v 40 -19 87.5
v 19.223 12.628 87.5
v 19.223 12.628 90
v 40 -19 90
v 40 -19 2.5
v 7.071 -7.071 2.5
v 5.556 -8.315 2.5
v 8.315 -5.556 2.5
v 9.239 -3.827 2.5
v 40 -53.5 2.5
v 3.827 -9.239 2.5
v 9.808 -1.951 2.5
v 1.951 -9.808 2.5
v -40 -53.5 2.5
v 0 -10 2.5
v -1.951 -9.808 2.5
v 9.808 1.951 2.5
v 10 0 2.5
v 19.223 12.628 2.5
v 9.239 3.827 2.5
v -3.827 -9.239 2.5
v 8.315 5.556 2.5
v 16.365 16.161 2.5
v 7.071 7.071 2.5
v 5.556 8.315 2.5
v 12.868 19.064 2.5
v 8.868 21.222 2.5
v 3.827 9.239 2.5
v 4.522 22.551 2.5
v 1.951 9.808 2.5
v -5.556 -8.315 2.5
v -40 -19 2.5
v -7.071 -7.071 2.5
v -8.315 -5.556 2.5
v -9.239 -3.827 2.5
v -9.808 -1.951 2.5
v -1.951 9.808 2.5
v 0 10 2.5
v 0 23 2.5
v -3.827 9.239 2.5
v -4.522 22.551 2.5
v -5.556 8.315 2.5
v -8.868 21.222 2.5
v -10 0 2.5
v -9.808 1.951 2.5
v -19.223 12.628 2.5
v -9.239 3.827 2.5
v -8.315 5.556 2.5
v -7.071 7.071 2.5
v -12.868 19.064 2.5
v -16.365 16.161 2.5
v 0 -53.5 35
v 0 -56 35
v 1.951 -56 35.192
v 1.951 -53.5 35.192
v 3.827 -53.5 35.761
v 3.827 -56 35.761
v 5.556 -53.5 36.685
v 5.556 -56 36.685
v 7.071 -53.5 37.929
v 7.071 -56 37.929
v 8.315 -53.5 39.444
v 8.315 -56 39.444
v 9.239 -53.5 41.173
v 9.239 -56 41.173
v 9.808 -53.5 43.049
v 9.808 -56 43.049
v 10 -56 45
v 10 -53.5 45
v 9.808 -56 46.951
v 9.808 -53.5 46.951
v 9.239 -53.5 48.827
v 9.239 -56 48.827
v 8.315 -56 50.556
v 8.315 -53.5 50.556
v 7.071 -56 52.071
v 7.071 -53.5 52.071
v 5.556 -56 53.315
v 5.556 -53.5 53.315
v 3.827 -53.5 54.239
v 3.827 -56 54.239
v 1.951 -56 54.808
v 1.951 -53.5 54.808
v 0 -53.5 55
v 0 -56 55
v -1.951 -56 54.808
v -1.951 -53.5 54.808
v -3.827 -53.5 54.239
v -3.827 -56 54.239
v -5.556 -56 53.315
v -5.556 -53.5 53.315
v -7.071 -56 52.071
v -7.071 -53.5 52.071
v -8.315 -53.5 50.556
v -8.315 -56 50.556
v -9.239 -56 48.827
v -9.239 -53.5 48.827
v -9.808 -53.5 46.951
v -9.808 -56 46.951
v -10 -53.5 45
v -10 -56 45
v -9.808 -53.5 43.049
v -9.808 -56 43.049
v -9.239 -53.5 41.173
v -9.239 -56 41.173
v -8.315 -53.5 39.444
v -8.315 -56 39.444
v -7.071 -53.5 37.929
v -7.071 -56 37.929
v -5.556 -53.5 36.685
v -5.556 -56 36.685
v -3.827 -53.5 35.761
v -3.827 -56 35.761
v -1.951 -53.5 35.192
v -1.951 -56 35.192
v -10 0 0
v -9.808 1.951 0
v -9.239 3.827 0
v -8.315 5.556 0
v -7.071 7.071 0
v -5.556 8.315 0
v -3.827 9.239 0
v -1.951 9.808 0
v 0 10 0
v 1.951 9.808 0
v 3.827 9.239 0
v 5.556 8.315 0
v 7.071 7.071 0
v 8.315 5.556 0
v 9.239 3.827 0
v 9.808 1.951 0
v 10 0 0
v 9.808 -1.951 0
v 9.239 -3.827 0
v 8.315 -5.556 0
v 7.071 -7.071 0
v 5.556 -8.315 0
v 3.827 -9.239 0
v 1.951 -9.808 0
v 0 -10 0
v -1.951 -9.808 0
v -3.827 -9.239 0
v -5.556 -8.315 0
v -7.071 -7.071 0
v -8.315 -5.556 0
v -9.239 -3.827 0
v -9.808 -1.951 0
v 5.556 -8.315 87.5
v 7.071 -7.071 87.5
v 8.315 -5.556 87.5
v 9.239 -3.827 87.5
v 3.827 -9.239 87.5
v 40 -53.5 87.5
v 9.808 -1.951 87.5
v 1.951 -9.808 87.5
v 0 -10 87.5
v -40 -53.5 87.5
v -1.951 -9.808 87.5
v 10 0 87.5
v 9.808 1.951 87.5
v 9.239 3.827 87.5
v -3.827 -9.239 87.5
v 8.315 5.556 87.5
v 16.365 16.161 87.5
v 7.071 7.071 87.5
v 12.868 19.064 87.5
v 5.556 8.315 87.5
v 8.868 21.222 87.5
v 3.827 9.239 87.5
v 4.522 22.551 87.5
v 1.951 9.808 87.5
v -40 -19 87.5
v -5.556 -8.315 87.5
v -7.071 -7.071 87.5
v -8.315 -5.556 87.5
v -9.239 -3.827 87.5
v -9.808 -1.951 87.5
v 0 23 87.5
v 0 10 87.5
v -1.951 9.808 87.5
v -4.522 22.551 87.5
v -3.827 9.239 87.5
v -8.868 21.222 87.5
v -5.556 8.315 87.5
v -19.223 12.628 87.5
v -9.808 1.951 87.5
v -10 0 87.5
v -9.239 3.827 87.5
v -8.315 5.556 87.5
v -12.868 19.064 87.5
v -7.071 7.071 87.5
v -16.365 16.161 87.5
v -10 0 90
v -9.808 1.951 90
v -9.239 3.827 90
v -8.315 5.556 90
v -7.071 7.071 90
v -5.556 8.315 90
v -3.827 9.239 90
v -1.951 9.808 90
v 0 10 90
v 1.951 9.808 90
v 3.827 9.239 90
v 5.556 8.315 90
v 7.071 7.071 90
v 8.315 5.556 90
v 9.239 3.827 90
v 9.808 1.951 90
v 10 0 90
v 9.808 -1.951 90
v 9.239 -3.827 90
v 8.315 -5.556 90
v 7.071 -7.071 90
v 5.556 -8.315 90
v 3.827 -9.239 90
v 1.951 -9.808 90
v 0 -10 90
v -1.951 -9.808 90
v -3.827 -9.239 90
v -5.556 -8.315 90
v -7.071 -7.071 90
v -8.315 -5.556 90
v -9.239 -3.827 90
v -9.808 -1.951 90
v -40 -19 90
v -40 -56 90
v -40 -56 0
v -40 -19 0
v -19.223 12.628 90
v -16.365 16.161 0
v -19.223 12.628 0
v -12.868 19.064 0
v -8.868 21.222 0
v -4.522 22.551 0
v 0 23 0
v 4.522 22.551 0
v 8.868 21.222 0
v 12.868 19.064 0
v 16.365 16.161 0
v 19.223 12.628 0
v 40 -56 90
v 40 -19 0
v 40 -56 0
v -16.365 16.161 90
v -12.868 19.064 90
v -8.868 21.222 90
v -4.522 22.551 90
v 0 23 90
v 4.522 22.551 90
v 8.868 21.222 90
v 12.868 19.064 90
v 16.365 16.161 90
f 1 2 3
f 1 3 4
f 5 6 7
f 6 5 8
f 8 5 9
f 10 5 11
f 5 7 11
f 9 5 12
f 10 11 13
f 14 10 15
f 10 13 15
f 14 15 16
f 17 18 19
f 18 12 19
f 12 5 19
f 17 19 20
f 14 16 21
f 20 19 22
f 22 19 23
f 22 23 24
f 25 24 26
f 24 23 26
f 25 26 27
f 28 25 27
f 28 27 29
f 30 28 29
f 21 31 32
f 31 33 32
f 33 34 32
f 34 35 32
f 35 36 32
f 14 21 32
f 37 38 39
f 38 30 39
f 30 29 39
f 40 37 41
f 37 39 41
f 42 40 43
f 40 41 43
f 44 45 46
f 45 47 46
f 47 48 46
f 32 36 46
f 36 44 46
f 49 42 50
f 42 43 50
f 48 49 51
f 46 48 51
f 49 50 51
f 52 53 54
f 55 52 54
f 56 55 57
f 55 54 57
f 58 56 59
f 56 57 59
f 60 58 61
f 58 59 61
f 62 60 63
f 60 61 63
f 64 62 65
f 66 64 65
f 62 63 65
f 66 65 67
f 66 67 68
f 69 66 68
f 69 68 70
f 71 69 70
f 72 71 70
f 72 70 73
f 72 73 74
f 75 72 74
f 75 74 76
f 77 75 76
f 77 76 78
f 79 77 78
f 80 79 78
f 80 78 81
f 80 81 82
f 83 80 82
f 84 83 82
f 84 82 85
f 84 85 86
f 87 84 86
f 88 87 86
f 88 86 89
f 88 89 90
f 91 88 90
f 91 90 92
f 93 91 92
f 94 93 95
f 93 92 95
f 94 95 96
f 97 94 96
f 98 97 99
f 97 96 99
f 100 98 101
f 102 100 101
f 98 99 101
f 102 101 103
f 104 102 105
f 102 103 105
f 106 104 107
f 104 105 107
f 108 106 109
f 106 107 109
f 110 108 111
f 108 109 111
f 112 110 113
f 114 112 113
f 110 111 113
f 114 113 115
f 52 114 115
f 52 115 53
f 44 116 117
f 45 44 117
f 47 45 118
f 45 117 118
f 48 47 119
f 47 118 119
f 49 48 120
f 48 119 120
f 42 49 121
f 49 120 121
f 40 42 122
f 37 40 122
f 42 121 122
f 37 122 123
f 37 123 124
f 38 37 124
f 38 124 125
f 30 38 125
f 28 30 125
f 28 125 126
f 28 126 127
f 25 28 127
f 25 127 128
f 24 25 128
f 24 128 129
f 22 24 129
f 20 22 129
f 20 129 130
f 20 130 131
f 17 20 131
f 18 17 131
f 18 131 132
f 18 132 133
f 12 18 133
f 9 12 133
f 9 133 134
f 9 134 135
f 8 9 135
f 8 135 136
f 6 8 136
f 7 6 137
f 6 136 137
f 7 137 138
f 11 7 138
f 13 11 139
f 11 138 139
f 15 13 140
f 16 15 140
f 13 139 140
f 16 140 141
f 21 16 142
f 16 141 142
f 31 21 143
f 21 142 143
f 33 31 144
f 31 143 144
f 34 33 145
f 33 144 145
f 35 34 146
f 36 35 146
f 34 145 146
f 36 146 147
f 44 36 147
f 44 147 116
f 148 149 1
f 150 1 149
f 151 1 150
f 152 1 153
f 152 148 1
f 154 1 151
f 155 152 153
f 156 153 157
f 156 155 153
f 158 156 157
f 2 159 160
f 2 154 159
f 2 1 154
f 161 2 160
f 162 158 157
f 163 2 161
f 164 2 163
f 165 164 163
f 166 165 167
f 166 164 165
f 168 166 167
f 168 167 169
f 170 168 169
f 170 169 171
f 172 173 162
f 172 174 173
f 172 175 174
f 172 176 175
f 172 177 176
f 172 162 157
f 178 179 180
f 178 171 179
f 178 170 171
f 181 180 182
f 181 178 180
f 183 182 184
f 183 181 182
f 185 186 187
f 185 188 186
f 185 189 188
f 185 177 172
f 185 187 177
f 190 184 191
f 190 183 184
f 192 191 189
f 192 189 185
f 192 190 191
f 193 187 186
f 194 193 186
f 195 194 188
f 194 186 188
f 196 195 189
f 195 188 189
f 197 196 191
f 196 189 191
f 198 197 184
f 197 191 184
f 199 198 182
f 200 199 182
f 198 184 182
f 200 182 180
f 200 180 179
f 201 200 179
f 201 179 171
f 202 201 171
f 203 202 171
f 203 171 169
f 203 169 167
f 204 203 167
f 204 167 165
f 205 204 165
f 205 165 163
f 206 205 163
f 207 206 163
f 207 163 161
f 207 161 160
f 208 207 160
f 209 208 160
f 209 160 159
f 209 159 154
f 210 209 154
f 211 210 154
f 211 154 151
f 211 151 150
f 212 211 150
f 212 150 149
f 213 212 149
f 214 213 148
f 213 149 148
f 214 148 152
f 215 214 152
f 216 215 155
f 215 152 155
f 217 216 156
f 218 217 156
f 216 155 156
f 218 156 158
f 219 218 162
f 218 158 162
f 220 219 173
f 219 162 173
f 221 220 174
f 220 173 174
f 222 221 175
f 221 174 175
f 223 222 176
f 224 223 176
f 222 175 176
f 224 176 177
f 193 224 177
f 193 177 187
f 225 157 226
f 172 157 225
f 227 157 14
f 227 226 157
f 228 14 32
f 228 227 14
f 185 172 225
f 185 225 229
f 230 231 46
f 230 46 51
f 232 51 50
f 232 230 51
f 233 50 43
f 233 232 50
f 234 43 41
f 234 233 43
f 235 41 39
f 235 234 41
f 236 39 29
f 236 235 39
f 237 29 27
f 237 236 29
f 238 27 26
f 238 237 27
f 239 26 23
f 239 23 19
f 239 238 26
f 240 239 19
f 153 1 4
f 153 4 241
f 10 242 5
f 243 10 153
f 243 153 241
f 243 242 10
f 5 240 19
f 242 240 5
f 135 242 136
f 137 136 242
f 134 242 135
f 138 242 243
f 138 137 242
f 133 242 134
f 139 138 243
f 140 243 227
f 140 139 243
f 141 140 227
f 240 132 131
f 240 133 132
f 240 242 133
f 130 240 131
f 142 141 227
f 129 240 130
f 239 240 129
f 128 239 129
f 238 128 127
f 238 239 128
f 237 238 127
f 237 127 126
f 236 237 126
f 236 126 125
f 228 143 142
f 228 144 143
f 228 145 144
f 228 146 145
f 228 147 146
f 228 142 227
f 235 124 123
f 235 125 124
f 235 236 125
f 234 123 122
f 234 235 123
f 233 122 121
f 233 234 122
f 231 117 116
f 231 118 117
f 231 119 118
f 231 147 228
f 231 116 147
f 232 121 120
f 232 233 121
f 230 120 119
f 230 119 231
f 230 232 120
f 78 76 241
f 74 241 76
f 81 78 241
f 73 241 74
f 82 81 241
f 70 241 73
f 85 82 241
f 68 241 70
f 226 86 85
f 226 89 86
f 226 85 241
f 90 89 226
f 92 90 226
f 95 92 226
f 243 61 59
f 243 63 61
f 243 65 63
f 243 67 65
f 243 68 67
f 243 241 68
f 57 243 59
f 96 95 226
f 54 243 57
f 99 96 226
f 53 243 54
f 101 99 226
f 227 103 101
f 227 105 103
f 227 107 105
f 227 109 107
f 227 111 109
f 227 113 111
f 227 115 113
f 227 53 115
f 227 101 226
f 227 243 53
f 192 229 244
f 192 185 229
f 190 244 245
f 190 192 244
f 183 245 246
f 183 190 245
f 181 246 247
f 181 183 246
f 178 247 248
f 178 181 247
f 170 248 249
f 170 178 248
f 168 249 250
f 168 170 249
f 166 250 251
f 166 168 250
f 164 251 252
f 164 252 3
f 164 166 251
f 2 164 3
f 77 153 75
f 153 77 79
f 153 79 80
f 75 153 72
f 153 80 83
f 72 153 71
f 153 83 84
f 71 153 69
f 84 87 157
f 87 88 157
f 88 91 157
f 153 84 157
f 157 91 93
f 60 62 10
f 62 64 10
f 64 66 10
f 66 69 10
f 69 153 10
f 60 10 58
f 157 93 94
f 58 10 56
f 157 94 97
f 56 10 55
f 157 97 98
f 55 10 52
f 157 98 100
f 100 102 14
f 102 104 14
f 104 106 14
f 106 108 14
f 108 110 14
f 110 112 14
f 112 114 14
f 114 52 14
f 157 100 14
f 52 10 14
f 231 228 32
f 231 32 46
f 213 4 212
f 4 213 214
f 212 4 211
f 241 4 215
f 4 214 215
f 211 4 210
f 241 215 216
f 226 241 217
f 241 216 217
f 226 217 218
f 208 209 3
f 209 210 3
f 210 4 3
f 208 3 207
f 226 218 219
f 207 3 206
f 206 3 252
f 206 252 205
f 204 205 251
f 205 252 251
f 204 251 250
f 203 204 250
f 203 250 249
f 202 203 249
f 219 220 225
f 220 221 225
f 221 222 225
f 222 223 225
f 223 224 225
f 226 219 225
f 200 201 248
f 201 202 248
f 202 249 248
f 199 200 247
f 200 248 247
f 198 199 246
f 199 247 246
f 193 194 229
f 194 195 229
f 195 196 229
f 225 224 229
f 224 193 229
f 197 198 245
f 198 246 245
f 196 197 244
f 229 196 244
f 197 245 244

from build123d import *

# Parameters (mm, degrees)
EXTRUSION1_DEPTH        = 90
COQUE1_T                = -2.5
ESQUISSE2_R             = 10
ENL_V_MAT_EXTRU_1_DEPTH = 90
ESQUISSE3_R             = 10
ENL_V_MAT_EXTRU_2_DEPTH = 114.296072306


with BuildPart() as part:
    # Esquisse1 → Extrusion1 (new body)
    with BuildSketch(Plane.XY):
        with BuildLine():
            Line((40, -56), (-40, -56))
            Line((-40, -56), (-40, -19))
            Line((-40, -19), (-19.223282024, 12.627962156))
            ThreePointArc((-19.223282024, 12.627962156), (0, 23), (19.223282024, 12.627962156))
            Line((19.223282024, 12.627962156), (40, -19))
            Line((40, -19), (40, -56))
        make_face()
    extrude(amount=EXTRUSION1_DEPTH)

    # Coque1
    coque1_openings = [part.faces().sort_by_distance(p)[0] for p in [
        (40, -37.5, 45),
        (-40, -37.5, 45),
        (-29.611641012, -3.186018922, 45),
        (0, 23, 45),
        (29.611641012, -3.186018922, 45),
    ]]
    offset(amount=COQUE1_T, openings=coque1_openings, kind=Kind.INTERSECTION)

    # Esquisse2 → Enlèv. mat.-Extru.1 (cut)
    with BuildSketch(Plane.XZ.offset(56)):
        with Locations(Location((0, 45, 0), (0, 0, 270))):
            Circle(ESQUISSE2_R)
    extrude(amount=-ENL_V_MAT_EXTRU_1_DEPTH, mode=Mode.SUBTRACT)

    # Esquisse3 → Enlèv. mat.-Extru.2 (cut, through all)
    with BuildSketch(Plane(origin=(0, 0, 0), x_dir=(-1, 0, 0), z_dir=(0, 0, -1))):
        Circle(ESQUISSE3_R)
    extrude(amount=-ENL_V_MAT_EXTRU_2_DEPTH, mode=Mode.SUBTRACT)


solid = part.part
